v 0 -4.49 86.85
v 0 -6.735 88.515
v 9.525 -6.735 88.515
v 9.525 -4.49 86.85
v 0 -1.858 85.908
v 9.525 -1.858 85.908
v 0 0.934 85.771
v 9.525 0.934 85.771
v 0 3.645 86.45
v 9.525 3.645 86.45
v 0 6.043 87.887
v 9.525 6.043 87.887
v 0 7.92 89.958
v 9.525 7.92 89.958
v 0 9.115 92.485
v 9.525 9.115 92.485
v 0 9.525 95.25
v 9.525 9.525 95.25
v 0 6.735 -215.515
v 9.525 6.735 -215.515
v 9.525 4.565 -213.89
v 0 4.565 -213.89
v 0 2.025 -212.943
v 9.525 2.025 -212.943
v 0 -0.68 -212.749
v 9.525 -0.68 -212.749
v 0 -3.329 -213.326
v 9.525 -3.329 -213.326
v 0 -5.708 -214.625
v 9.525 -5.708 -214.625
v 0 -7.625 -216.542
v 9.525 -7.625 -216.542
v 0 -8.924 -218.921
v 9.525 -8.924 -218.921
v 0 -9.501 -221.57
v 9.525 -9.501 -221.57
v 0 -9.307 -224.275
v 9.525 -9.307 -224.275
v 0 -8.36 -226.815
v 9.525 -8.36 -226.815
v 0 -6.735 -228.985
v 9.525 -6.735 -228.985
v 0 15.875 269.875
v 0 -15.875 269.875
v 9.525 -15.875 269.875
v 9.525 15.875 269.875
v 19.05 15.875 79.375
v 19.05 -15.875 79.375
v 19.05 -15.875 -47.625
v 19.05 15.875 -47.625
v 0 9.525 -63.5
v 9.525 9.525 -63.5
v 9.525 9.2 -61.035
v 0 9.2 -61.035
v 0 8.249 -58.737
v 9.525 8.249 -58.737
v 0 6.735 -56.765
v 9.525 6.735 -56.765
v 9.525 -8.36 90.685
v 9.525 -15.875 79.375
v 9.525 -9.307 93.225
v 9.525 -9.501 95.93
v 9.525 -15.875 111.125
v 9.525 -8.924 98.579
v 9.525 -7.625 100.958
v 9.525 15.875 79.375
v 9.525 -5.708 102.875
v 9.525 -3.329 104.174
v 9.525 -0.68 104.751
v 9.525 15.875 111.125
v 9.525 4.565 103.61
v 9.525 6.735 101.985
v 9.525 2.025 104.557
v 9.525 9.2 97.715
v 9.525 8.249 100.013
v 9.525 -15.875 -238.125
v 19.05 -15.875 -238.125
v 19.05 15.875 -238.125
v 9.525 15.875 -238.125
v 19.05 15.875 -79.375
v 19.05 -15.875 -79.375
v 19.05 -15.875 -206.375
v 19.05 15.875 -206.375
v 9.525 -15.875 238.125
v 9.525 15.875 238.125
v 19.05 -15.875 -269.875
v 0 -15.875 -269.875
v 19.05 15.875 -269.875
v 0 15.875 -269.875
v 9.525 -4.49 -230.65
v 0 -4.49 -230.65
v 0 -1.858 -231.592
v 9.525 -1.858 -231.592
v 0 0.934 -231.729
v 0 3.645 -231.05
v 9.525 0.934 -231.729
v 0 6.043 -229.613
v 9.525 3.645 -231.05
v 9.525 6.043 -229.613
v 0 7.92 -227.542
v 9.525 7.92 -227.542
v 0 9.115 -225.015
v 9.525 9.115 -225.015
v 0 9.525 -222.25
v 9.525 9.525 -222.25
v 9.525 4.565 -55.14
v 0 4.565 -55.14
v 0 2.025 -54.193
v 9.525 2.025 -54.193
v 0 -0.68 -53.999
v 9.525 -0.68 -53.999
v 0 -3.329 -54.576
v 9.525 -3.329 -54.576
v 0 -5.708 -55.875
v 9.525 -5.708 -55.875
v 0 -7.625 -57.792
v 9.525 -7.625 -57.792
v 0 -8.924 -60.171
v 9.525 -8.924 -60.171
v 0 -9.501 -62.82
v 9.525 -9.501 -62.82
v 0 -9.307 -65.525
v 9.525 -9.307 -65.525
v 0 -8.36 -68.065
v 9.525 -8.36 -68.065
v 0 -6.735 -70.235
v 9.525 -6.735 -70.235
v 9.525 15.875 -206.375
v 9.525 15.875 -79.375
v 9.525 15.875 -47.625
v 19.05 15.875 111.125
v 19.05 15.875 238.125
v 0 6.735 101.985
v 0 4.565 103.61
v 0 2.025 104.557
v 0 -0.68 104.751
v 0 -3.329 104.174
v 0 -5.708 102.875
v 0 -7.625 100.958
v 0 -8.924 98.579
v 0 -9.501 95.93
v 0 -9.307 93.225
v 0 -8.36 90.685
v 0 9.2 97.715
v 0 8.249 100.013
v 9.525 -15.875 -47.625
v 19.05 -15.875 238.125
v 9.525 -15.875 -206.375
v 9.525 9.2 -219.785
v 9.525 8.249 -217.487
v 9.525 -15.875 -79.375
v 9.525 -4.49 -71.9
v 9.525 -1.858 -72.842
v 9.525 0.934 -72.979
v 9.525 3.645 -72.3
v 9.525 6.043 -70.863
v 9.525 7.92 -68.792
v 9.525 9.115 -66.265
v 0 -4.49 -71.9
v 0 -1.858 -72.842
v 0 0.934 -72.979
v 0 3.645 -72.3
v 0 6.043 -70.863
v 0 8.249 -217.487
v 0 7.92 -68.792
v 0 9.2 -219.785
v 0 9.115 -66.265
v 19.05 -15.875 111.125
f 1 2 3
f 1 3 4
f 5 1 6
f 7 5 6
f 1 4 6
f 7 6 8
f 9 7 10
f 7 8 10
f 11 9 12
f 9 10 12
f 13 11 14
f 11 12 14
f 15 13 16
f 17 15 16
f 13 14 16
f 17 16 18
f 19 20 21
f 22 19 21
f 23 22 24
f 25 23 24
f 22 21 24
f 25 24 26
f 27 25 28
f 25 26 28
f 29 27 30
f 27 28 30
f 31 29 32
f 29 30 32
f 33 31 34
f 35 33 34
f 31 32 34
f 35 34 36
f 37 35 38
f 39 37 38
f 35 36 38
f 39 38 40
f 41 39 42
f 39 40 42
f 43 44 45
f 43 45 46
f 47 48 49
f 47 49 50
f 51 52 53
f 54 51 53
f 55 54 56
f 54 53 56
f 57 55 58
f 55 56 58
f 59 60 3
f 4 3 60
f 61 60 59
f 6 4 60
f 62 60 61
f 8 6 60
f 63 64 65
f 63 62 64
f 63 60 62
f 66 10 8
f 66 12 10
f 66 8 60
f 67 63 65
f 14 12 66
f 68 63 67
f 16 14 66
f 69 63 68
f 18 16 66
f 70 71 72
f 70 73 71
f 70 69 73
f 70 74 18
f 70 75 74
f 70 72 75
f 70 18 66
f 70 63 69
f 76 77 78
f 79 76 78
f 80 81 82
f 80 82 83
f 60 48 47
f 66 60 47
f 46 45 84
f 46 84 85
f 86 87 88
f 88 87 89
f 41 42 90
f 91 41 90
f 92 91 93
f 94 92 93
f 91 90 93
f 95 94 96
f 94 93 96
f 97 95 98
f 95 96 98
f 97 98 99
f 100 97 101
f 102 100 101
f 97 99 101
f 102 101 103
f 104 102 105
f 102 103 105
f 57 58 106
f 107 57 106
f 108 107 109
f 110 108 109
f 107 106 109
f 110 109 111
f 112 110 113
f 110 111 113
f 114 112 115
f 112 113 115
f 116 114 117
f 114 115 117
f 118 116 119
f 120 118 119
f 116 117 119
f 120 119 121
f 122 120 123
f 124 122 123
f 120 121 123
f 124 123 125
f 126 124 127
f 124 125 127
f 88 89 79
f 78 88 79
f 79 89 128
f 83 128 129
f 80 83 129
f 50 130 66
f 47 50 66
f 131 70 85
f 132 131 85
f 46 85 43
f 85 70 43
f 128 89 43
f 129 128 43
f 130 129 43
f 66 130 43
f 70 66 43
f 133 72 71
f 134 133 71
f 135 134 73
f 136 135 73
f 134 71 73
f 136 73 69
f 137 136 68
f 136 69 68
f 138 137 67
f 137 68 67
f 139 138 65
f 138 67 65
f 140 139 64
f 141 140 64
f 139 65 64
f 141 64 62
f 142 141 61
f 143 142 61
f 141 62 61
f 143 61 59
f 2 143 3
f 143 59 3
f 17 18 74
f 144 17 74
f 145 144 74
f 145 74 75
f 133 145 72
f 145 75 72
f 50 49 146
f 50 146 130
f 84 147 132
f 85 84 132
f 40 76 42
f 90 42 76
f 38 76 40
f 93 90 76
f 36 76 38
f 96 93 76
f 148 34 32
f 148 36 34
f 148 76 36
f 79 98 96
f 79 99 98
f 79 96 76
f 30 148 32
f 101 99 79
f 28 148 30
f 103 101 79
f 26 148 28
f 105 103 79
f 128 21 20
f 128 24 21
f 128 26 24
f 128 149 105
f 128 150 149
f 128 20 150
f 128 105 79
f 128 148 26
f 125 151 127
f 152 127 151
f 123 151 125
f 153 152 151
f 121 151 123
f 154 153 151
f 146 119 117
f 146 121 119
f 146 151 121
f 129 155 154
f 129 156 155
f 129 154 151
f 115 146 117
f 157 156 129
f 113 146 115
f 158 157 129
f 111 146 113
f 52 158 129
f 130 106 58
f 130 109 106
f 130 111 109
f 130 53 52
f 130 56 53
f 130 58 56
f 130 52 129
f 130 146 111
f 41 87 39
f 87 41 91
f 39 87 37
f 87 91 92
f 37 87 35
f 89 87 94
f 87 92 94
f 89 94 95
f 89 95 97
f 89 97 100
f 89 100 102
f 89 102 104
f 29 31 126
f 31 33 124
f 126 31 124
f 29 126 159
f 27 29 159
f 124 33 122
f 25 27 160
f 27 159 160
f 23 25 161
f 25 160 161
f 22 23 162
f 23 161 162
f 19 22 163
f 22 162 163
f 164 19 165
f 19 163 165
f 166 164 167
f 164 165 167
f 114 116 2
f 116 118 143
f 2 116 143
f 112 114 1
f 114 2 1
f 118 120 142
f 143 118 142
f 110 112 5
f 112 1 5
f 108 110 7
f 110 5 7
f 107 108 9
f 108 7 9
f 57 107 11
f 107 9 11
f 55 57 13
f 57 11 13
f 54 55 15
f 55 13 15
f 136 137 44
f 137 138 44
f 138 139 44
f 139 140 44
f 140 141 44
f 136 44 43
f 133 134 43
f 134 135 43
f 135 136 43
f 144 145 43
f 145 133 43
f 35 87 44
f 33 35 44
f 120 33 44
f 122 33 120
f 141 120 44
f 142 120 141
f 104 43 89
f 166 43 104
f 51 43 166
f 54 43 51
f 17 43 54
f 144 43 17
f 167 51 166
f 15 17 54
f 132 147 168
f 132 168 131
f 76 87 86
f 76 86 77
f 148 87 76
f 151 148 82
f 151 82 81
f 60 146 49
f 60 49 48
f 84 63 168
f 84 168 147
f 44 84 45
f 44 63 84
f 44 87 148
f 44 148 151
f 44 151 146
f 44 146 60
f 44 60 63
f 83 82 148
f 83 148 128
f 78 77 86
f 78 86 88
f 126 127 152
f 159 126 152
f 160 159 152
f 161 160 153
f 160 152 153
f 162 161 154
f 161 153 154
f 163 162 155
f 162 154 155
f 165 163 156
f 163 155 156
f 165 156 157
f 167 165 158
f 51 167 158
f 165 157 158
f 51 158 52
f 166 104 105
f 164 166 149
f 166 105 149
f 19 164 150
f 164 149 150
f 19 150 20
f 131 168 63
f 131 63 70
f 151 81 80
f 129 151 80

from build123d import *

# Parameters (mm, degrees)
F0_W     = 31.75
F0_H     = 539.75
F1_DEPTH = 19.05
F2_W     = 31.75
F2_H     = 31.75
F3_DEPTH = 9.525
F5_DEPTH = 25.4
F7_DEPTH = 25.4
F9_DEPTH = 25.4


with BuildPart() as f1:
    # F0 (on Right) → F1 (new body)
    with BuildSketch(Plane.YZ):
        Rectangle(F0_W, F0_H)
    extrude(amount=F1_DEPTH)

    # F2 (on face) → F3 (cut)
    with BuildSketch(Plane.YZ.offset(19.05)):
        with Locations((0, 254)):
            Rectangle(F2_W, F2_H)
        with Locations((0, -222.25)):
            Rectangle(F2_W, F2_H)
        with Locations((0, 95.25)):
            Rectangle(F2_W, F2_H)
        with Locations((0, -63.5)):
            Rectangle(F2_W, F2_H)
    extrude(amount=-F3_DEPTH, mode=Mode.SUBTRACT)

    # F4 (on face) → F5 (cut)
    with BuildSketch(Plane.YZ.offset(9.525)):
        with BuildLine():
            ThreePointArc((6.735192, 101.985192), (-6.735192, 101.985192), (-6.735192, 88.514808))
            Line((-6.735192, 88.514808), (6.735192, 101.985192))
        make_face()
        with BuildLine():
            Line((6.735192, 101.985192), (-6.735192, 88.514808))
            ThreePointArc((-6.735192, 88.514808), (3.64506, 86.450047), (9.525, 95.25))
            ThreePointArc((9.525, 95.25), (8.799953, 98.89506), (6.735192, 101.985192))
        make_face()
    extrude(amount=-F5_DEPTH, mode=Mode.SUBTRACT)

    # F6 (on face) → F7 (cut)
    with BuildSketch(Plane.YZ.offset(9.525)):
        with BuildLine():
            ThreePointArc((6.735192, -56.764808), (-6.735192, -56.764808), (-6.735192, -70.235192))
            Line((-6.735192, -70.235192), (6.735192, -56.764808))
        make_face()
        with BuildLine():
            Line((6.735192, -56.764808), (-6.735192, -70.235192))
            ThreePointArc((-6.735192, -70.235192), (3.64506, -72.299953), (9.525, -63.5))
            ThreePointArc((9.525, -63.5), (8.799953, -59.85494), (6.735192, -56.764808))
        make_face()
    extrude(amount=-F7_DEPTH, mode=Mode.SUBTRACT)

    # F8 (on face) → F9 (cut)
    with BuildSketch(Plane.YZ.offset(9.525)):
        with BuildLine():
            ThreePointArc((6.735192, -215.514808), (-6.735192, -215.514808), (-6.735192, -228.985192))
            Line((-6.735192, -228.985192), (6.735192, -215.514808))
        make_face()
        with BuildLine():
            Line((6.735192, -215.514808), (-6.735192, -228.985192))
            ThreePointArc((-6.735192, -228.985192), (3.64506, -231.049953), (9.525, -222.25))
            ThreePointArc((9.525, -222.25), (8.799953, -218.60494), (6.735192, -215.514808))
        make_face()
    extrude(amount=-F9_DEPTH, mode=Mode.SUBTRACT)


solid = f1.part
